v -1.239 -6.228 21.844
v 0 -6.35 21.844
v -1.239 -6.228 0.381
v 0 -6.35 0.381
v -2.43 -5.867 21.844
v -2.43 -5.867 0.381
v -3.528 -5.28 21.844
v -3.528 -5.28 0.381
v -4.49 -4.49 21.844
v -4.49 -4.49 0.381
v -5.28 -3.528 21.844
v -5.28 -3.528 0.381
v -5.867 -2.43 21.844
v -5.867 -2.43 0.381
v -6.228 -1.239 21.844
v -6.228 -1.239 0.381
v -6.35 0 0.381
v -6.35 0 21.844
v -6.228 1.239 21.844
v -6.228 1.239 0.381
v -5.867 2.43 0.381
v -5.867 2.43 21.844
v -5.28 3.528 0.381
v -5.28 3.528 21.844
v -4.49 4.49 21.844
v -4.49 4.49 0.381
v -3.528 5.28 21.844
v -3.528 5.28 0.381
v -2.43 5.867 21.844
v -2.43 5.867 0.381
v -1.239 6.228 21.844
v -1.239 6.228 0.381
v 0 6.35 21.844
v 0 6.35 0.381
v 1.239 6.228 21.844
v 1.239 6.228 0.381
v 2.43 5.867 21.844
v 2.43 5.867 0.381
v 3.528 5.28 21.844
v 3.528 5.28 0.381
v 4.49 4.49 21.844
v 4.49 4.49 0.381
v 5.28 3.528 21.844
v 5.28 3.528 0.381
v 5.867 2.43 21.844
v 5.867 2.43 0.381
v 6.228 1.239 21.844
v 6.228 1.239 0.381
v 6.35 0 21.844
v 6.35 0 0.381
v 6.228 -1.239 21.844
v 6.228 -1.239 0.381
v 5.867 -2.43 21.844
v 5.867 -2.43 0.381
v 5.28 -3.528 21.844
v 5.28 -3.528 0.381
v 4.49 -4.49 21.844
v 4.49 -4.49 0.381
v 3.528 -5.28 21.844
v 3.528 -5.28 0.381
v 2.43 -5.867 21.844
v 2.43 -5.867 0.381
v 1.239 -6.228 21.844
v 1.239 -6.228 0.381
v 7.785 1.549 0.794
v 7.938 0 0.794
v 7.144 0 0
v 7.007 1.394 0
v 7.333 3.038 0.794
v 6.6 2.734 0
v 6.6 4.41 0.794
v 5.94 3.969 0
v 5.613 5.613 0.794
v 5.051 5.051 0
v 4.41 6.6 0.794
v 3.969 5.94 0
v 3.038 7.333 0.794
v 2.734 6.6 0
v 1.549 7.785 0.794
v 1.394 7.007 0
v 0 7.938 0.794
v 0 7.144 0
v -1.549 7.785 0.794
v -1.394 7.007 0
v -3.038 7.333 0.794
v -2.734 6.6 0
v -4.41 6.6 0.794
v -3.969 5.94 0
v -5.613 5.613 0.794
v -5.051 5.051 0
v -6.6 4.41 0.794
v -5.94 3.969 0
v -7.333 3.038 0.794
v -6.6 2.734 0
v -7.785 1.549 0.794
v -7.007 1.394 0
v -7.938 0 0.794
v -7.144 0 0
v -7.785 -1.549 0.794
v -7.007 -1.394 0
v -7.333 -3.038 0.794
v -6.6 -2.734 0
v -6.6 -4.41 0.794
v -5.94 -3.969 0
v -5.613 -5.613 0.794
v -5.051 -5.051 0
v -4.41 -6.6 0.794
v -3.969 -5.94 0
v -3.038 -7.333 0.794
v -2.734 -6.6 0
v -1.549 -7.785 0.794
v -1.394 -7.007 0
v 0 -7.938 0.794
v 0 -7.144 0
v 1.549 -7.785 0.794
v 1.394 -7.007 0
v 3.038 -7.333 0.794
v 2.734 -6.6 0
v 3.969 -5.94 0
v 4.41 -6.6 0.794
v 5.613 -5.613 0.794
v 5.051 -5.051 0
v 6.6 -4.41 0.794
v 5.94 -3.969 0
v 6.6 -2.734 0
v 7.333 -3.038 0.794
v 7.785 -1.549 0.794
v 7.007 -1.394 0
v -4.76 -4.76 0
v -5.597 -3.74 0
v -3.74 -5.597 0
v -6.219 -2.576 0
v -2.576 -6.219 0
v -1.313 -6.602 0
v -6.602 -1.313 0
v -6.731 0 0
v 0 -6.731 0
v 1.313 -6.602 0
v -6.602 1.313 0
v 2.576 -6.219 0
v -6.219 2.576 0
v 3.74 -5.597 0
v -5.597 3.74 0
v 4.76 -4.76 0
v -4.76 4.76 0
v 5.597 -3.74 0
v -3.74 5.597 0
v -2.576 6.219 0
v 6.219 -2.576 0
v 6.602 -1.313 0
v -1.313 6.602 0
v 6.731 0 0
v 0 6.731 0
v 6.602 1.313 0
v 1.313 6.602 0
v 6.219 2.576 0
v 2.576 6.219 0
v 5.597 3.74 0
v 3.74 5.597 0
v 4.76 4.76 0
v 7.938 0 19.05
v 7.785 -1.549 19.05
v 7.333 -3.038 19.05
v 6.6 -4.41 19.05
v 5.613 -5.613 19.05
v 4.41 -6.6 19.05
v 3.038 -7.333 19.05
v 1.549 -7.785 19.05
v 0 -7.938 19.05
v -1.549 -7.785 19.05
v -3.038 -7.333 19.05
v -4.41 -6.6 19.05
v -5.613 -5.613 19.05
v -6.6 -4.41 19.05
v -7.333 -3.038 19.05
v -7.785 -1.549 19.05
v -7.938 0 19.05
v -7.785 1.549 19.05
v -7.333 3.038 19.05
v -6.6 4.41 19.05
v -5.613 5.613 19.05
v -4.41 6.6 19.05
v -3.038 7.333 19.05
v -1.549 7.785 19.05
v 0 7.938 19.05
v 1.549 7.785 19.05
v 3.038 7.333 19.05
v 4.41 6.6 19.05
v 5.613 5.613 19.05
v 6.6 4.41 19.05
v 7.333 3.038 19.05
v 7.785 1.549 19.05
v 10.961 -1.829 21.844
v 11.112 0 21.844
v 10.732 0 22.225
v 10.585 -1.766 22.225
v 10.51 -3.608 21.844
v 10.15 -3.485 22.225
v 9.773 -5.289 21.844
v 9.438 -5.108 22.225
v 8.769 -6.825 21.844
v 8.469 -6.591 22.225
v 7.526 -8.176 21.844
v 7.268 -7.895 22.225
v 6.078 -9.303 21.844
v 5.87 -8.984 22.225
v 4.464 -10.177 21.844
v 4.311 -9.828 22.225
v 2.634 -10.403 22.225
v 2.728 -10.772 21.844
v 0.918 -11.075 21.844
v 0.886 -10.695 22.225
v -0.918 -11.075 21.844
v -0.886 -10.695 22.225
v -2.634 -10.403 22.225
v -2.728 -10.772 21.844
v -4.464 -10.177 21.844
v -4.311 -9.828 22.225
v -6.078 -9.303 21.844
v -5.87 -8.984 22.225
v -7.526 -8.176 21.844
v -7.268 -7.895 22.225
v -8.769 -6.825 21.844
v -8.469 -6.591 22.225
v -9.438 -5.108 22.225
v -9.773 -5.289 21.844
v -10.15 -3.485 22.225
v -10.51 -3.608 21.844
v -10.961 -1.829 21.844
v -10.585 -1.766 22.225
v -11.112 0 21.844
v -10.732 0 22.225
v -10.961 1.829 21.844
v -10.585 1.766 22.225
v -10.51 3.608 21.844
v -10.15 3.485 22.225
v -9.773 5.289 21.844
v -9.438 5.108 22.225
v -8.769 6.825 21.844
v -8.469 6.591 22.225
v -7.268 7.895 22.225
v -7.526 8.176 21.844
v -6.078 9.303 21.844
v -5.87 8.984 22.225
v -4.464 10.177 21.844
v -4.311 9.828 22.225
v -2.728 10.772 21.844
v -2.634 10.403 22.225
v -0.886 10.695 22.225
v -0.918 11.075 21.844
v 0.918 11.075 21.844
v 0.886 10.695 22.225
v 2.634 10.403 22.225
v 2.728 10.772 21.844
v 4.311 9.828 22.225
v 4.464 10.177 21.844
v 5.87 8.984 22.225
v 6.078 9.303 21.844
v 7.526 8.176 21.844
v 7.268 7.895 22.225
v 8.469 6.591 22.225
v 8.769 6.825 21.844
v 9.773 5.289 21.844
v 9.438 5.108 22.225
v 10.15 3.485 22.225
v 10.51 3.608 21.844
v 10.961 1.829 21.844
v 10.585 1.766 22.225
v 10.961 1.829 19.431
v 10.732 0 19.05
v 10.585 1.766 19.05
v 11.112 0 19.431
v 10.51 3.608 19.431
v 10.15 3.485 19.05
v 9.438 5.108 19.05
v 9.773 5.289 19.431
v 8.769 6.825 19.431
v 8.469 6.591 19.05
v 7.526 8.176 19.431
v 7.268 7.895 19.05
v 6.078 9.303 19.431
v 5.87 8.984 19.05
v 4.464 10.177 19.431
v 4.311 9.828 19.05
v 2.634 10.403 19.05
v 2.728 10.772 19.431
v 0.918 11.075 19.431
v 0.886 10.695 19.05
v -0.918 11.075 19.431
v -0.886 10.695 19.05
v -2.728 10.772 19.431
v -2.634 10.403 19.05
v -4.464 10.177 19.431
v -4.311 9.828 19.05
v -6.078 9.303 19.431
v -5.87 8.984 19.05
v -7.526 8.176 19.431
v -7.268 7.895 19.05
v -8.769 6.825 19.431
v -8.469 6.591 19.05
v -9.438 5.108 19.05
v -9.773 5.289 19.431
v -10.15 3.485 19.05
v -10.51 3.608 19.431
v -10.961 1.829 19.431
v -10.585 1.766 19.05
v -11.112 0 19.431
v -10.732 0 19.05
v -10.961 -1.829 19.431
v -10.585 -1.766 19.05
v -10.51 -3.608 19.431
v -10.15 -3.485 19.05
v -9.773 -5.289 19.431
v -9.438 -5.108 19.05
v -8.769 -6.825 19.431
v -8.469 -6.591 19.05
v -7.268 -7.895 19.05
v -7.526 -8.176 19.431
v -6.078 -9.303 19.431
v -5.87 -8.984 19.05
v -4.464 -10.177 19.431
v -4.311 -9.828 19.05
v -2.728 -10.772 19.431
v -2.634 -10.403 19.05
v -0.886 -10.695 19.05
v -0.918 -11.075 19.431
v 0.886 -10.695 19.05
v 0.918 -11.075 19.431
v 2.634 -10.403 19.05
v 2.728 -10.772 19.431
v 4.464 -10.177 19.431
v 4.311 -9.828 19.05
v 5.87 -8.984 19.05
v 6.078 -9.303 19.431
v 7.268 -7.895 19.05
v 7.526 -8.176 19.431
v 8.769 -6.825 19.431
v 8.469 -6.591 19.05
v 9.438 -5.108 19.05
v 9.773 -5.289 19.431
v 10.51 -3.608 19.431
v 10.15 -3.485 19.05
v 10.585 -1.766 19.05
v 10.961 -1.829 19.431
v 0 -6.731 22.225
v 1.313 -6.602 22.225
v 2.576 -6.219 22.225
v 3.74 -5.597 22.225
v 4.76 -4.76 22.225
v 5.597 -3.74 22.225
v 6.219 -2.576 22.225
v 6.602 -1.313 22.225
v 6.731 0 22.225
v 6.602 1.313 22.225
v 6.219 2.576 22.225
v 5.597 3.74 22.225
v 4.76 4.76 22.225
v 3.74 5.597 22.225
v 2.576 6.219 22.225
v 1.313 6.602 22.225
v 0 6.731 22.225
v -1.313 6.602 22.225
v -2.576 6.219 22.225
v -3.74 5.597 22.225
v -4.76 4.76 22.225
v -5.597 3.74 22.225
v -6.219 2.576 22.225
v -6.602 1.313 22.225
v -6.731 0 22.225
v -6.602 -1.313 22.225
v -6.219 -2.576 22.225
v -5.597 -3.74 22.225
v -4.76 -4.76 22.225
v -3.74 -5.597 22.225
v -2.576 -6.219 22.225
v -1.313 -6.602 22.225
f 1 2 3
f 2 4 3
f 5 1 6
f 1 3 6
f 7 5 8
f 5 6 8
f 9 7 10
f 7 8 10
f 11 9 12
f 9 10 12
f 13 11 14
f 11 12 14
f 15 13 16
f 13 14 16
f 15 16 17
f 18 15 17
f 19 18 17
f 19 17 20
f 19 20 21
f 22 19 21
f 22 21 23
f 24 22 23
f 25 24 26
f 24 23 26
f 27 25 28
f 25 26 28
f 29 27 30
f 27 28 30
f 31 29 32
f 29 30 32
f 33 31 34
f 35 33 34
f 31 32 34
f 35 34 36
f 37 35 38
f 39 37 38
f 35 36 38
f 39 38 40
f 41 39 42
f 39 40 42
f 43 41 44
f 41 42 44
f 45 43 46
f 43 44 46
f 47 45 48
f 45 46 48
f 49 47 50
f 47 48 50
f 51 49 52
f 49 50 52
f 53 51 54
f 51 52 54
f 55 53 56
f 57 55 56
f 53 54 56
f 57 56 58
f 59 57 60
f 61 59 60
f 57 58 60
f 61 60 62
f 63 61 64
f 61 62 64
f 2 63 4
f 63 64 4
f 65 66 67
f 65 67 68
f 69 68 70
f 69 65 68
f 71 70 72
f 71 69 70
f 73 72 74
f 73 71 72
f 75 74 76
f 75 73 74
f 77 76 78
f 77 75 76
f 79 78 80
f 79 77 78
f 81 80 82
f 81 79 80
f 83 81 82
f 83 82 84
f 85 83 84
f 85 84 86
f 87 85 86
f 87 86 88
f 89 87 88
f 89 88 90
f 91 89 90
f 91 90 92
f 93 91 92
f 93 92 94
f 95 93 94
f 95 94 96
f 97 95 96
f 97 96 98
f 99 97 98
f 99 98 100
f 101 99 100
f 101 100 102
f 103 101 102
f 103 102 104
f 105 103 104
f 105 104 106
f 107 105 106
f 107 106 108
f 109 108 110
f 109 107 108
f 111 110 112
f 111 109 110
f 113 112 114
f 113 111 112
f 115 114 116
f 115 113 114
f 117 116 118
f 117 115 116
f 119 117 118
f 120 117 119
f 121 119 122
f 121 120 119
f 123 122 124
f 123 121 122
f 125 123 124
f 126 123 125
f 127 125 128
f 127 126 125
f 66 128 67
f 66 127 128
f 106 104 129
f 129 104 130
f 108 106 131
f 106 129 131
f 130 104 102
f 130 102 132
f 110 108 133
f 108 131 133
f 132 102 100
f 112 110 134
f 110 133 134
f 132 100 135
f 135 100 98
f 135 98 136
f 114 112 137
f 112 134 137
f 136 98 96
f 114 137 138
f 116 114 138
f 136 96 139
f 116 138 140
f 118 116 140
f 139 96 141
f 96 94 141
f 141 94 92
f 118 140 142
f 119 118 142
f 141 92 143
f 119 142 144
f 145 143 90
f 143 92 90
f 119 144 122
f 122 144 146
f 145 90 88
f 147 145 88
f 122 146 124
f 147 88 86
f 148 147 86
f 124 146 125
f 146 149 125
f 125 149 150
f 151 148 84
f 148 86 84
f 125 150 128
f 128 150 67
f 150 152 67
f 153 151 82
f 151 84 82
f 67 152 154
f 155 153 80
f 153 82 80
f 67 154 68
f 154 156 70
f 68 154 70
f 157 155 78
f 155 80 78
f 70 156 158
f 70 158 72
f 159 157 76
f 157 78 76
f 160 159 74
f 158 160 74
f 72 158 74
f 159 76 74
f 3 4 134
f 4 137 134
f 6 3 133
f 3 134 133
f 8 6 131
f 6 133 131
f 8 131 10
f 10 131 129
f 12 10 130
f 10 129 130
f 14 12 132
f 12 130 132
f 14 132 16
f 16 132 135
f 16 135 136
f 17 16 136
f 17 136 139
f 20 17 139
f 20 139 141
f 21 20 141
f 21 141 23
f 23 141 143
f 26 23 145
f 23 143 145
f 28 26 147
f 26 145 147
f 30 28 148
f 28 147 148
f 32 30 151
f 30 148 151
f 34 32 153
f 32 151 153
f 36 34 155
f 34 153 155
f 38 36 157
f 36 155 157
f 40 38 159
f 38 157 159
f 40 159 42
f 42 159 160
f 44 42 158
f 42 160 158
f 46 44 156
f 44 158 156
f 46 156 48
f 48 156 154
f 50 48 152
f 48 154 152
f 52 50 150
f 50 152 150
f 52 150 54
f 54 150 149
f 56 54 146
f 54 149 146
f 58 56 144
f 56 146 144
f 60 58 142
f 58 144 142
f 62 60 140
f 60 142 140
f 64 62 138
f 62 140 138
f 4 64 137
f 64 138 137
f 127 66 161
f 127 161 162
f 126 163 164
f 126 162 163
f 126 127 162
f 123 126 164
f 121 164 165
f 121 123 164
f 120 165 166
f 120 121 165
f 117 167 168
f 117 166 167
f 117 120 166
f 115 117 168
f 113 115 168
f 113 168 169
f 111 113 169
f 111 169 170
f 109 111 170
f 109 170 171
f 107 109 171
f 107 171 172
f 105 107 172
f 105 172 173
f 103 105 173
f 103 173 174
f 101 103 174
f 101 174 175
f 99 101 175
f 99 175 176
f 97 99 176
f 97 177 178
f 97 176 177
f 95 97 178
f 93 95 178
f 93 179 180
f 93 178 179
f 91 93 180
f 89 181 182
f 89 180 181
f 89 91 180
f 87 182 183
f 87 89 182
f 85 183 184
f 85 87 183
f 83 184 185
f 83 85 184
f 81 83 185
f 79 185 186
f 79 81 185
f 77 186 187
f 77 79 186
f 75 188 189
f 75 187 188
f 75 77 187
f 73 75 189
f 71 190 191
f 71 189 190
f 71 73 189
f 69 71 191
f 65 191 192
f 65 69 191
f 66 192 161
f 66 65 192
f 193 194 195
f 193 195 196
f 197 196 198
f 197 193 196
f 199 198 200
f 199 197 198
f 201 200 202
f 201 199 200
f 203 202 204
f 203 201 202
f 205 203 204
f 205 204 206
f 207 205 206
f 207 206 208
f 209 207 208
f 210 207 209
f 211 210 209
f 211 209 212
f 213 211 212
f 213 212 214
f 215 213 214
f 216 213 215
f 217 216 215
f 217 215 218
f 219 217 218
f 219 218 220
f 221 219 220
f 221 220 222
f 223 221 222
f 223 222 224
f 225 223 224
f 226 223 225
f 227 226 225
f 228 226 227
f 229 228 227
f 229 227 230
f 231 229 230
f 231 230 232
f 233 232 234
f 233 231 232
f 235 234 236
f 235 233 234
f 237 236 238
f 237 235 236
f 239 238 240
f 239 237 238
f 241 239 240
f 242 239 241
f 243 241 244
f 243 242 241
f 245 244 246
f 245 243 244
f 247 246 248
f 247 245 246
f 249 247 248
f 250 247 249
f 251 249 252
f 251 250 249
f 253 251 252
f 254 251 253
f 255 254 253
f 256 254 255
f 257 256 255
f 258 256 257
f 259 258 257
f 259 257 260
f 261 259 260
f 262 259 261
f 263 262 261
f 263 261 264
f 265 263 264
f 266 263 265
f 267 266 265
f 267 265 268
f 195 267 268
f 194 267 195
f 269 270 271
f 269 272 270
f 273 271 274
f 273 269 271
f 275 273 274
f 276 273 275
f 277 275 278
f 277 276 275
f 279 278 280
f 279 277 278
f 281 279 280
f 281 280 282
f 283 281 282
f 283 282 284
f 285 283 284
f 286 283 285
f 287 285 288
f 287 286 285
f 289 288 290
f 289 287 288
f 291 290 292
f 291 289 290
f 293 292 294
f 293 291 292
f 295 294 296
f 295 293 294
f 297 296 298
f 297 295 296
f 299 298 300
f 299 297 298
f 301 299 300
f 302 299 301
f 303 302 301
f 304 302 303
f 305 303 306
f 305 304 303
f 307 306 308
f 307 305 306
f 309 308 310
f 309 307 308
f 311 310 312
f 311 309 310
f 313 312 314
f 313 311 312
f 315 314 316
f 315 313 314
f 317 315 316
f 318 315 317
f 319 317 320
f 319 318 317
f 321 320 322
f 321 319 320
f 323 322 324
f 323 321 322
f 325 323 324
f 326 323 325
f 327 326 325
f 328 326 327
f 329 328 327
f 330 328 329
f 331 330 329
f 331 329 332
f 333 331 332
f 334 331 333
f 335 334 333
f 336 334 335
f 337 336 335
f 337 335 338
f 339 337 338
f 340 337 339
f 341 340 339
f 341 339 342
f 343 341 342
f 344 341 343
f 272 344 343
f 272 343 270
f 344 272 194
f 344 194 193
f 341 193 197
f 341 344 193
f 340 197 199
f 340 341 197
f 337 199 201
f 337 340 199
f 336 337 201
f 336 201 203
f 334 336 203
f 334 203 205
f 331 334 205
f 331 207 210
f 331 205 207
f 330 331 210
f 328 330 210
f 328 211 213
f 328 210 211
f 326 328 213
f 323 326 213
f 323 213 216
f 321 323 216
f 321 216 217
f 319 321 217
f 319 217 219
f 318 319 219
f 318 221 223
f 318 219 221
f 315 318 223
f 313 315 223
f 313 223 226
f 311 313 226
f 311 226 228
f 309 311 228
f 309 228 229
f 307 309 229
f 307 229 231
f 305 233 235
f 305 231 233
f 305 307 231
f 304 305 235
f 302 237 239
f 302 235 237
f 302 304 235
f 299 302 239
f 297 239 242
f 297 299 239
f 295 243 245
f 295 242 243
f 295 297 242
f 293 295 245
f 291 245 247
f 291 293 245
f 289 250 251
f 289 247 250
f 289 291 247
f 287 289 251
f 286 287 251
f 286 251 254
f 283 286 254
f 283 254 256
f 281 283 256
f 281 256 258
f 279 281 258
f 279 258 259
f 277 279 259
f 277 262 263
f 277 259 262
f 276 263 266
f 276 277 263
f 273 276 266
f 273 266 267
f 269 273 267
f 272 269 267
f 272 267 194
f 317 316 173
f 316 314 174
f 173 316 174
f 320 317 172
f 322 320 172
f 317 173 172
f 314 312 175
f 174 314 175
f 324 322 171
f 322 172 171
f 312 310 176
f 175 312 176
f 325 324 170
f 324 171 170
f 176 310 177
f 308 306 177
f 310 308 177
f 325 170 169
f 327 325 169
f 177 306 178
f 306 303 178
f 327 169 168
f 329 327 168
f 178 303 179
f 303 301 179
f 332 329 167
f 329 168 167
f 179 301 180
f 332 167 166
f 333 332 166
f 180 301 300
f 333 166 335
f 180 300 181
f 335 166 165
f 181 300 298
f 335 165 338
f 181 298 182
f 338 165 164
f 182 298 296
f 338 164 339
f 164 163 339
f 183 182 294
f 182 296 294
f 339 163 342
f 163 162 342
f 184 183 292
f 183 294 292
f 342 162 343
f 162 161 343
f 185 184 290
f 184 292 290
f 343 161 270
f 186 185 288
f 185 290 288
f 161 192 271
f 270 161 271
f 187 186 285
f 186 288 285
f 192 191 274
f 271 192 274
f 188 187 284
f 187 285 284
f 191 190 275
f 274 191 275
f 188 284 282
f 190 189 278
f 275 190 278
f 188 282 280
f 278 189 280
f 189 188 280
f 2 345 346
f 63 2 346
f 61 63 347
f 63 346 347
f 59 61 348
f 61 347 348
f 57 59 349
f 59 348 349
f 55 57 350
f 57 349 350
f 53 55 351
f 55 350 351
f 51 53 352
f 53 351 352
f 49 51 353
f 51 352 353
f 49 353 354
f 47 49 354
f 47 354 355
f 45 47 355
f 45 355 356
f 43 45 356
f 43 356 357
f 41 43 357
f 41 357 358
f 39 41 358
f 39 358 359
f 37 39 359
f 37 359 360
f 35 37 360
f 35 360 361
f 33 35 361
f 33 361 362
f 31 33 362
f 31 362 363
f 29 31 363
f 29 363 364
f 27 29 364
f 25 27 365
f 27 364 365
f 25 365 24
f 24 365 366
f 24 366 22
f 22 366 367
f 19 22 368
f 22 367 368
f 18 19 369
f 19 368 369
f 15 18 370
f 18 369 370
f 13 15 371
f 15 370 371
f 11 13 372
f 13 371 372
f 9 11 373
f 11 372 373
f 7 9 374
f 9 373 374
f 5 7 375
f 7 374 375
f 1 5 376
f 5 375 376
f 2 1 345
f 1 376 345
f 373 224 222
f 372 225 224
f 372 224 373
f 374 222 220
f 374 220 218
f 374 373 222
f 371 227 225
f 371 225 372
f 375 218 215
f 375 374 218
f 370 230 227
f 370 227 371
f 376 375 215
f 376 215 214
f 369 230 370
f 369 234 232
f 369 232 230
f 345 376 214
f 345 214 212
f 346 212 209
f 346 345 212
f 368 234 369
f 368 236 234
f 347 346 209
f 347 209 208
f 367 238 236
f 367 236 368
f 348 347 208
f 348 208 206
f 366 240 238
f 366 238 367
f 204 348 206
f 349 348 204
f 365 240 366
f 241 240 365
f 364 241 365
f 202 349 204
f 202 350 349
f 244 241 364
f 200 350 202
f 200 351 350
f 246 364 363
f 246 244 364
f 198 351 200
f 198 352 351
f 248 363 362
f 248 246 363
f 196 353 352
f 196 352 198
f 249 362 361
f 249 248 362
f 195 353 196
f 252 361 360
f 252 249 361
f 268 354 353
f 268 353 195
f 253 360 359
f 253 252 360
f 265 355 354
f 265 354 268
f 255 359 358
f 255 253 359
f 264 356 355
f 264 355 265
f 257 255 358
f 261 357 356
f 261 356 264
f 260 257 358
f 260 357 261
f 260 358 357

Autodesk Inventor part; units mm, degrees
ref_plane "YZ Plane" through (0, 0, 0) normal (1, 0, 0) x (0, 1, 0)
ref_plane "XZ Plane" through (0, 0, 0) normal (0, 1, 0) x (-1, 0, 0)
ref_plane "XY Plane" through (0, 0, 0) normal (0, 0, 1) x (1, 0, 0)
sketch "Sketch1" plane through (0, 0, 0) normal (0, 0, 1) x (1, 0, 0)
  circle A0 centre (0, 0) radius 7.9375
  dimension "d0" = 15.875
extrude "Extrusion1" add sketch "Sketch1" along normal blind 19.05
sketch "Sketch2" plane through (0, 0, 19.05) normal (0, 0, 1) x (1, 0, 0)
  circle A0 centre (0, 0) radius 7.9375 projected
  circle A1 centre (0, 0) radius 11.1125
  dimension "d3" = 3.175
extrude "Extrusion2" add sketch "Sketch2" along normal blind 3.175 contours A0 | A1
chamfer "Chamfer1" distance 0.7937 angle 45 1 edges at (-7.9375, 0, 0)
sketch "Sketch3" plane through (0, 0, 22.225) normal (0, 0, 1) x (1, 0, 0)
  circle A0 centre (0, 0) radius 11.1125 projected
hole "Hole1" at (0, 0, 22.225) direction (0, 0, -1) diameter 12.7 end through all
chamfer "Chamfer2" distance 0.381 angle 45 2 edges at (0, 6.35, 22.225) (0, 6.35, 0)
chamfer "Chamfer3" distance 0.381 angle 45 2 edges at (-11.1125, 0, 22.225) (-11.1125, 0, 19.05)
properties part number "PWTR-0026" material "Bronze, Soft Tin"
